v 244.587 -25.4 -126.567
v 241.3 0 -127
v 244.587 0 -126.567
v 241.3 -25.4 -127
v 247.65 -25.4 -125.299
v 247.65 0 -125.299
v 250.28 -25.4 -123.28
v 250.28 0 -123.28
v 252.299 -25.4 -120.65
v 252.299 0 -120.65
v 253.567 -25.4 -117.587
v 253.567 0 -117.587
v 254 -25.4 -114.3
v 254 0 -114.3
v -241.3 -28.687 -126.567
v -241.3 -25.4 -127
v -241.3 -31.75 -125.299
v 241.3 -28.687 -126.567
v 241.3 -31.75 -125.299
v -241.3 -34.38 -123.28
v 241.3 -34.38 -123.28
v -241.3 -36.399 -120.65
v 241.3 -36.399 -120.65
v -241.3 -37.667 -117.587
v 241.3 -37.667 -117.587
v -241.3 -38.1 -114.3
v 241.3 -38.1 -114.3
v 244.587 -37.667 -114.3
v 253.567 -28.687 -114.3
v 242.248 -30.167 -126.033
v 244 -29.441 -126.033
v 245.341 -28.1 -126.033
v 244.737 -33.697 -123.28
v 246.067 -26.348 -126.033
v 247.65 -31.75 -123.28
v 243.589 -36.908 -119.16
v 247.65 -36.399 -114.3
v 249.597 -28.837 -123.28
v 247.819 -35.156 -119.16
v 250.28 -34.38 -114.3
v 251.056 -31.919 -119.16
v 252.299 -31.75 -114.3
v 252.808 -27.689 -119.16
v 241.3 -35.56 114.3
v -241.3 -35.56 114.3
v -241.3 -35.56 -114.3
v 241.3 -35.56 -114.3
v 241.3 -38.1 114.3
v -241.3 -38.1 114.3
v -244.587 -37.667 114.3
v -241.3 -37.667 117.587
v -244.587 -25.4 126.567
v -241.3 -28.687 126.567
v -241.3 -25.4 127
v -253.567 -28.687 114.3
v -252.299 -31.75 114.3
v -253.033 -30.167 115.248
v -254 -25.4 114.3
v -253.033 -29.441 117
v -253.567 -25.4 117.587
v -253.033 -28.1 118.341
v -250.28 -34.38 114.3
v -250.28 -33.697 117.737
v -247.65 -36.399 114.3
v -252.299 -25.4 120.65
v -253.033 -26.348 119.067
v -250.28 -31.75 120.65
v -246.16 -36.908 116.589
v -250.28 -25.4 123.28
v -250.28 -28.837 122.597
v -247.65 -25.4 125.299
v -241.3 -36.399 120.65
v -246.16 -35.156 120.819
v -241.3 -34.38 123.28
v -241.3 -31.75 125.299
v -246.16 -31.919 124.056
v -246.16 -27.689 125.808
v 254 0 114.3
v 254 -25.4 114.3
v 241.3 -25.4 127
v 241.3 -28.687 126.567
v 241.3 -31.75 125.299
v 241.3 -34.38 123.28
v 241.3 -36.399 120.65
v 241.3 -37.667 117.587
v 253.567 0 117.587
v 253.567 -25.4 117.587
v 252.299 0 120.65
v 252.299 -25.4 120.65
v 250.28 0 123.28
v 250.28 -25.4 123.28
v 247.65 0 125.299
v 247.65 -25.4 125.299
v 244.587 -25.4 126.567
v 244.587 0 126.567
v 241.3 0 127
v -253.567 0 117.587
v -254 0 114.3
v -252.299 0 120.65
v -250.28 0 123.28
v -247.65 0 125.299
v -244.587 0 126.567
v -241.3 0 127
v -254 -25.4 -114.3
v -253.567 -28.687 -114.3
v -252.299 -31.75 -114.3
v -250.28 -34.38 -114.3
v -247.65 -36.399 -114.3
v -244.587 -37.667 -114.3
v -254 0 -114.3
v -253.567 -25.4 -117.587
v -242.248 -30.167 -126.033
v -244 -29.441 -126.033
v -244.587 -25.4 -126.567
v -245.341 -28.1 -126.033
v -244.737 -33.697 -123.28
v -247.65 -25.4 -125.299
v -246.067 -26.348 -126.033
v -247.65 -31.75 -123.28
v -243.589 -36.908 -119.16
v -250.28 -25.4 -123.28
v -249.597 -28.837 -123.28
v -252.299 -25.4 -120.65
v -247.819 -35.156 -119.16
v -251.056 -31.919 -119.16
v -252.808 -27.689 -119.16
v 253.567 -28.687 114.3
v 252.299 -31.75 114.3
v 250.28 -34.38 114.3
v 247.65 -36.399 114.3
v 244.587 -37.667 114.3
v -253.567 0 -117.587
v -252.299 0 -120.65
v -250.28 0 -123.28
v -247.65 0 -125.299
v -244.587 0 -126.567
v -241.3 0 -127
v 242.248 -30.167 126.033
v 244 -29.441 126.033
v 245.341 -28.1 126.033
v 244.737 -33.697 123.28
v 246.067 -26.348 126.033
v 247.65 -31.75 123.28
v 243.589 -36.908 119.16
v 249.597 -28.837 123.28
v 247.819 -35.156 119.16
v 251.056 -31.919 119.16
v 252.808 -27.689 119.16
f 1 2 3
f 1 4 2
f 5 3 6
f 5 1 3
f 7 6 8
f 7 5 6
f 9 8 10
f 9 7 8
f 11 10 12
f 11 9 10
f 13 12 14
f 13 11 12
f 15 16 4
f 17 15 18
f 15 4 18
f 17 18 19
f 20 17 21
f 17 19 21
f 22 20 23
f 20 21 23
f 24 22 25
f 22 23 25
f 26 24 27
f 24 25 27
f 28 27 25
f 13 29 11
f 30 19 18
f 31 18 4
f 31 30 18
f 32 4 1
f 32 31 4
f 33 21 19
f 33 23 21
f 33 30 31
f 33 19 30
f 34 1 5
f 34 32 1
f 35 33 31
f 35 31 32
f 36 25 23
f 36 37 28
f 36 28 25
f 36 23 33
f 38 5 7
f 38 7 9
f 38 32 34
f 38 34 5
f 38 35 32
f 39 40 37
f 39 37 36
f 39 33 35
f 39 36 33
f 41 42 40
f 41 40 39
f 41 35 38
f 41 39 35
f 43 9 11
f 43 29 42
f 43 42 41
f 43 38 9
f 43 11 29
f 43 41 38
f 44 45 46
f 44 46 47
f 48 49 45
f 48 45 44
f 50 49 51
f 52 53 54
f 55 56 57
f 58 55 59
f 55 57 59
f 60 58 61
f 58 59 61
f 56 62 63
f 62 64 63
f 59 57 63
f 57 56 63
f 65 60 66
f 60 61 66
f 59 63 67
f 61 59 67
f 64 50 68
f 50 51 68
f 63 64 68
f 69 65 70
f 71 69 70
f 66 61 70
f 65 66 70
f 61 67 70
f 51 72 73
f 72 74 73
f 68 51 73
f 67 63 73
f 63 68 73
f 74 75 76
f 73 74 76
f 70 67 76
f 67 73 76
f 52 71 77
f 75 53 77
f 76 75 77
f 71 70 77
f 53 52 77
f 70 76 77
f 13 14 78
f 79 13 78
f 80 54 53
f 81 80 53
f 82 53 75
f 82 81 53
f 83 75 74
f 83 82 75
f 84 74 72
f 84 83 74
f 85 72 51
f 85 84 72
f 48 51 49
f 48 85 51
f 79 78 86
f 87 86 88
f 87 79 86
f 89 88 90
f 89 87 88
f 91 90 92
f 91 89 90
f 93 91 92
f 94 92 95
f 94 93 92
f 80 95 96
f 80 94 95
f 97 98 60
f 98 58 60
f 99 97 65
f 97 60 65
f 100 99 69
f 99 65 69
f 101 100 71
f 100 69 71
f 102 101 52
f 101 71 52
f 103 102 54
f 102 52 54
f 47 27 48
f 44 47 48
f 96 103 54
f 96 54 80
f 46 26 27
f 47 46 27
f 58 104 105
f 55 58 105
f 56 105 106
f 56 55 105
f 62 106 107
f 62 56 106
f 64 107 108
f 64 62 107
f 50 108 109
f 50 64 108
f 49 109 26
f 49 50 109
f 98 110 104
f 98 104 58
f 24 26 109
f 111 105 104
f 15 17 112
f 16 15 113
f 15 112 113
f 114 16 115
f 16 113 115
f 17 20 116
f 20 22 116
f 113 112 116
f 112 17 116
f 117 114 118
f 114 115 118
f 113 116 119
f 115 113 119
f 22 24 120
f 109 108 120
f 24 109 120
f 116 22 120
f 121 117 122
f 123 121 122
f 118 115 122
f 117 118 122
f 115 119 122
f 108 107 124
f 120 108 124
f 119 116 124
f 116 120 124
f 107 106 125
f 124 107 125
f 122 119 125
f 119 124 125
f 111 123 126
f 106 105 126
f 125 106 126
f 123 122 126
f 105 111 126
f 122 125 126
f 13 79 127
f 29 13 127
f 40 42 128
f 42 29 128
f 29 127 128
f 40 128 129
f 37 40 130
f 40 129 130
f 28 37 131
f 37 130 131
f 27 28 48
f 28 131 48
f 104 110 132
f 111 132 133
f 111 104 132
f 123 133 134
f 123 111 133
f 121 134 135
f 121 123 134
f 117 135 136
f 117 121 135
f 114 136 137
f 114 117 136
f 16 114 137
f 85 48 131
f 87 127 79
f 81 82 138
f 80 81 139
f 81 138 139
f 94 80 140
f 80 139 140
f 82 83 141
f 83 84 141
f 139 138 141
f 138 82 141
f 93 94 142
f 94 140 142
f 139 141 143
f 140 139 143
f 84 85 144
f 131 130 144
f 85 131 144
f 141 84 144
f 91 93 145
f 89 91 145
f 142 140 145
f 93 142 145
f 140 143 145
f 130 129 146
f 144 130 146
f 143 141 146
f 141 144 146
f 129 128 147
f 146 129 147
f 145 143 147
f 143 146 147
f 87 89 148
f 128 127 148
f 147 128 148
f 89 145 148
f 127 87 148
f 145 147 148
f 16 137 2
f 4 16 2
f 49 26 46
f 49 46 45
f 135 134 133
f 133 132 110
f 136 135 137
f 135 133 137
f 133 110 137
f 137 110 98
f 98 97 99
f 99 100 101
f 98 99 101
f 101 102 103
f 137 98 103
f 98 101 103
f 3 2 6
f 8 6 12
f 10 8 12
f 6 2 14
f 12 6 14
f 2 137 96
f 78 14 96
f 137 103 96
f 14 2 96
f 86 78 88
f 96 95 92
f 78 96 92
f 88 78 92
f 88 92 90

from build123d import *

# Parameters (mm, degrees)
F0_W      = 508
F0_H      = 254
F1_DEPTH  = 38.1
F2_R      = 12.7
F1_FACE_W = 482.6
F1_FACE_H = 228.6
F3_DEPTH  = 2.54


with BuildPart() as f1:
    # F0 (on Front) → F1 (new body)
    with BuildSketch(Plane.XZ):
        Rectangle(F0_W, F0_H)
    extrude(amount=F1_DEPTH)

    # F2
    f2_edges = [f1.edges().sort_by_distance(p)[0] for p in [
        (254, -38.1, 0),
        (0, -38.1, 127),
        (-254, -38.1, 0),
        (0, -38.1, -127),
        (-254, -19.05, 127),
        (254, -19.05, 127),
        (254, -19.05, -127),
        (-254, -19.05, -127),
    ]]
    fillet(f2_edges, radius=F2_R)

    # F1_face (on face) → F3 (cut)
    with BuildSketch(Plane.XZ.offset(38.1)):
        Rectangle(F1_FACE_W, F1_FACE_H)
    extrude(amount=-F3_DEPTH, mode=Mode.SUBTRACT)


solid = f1.part
